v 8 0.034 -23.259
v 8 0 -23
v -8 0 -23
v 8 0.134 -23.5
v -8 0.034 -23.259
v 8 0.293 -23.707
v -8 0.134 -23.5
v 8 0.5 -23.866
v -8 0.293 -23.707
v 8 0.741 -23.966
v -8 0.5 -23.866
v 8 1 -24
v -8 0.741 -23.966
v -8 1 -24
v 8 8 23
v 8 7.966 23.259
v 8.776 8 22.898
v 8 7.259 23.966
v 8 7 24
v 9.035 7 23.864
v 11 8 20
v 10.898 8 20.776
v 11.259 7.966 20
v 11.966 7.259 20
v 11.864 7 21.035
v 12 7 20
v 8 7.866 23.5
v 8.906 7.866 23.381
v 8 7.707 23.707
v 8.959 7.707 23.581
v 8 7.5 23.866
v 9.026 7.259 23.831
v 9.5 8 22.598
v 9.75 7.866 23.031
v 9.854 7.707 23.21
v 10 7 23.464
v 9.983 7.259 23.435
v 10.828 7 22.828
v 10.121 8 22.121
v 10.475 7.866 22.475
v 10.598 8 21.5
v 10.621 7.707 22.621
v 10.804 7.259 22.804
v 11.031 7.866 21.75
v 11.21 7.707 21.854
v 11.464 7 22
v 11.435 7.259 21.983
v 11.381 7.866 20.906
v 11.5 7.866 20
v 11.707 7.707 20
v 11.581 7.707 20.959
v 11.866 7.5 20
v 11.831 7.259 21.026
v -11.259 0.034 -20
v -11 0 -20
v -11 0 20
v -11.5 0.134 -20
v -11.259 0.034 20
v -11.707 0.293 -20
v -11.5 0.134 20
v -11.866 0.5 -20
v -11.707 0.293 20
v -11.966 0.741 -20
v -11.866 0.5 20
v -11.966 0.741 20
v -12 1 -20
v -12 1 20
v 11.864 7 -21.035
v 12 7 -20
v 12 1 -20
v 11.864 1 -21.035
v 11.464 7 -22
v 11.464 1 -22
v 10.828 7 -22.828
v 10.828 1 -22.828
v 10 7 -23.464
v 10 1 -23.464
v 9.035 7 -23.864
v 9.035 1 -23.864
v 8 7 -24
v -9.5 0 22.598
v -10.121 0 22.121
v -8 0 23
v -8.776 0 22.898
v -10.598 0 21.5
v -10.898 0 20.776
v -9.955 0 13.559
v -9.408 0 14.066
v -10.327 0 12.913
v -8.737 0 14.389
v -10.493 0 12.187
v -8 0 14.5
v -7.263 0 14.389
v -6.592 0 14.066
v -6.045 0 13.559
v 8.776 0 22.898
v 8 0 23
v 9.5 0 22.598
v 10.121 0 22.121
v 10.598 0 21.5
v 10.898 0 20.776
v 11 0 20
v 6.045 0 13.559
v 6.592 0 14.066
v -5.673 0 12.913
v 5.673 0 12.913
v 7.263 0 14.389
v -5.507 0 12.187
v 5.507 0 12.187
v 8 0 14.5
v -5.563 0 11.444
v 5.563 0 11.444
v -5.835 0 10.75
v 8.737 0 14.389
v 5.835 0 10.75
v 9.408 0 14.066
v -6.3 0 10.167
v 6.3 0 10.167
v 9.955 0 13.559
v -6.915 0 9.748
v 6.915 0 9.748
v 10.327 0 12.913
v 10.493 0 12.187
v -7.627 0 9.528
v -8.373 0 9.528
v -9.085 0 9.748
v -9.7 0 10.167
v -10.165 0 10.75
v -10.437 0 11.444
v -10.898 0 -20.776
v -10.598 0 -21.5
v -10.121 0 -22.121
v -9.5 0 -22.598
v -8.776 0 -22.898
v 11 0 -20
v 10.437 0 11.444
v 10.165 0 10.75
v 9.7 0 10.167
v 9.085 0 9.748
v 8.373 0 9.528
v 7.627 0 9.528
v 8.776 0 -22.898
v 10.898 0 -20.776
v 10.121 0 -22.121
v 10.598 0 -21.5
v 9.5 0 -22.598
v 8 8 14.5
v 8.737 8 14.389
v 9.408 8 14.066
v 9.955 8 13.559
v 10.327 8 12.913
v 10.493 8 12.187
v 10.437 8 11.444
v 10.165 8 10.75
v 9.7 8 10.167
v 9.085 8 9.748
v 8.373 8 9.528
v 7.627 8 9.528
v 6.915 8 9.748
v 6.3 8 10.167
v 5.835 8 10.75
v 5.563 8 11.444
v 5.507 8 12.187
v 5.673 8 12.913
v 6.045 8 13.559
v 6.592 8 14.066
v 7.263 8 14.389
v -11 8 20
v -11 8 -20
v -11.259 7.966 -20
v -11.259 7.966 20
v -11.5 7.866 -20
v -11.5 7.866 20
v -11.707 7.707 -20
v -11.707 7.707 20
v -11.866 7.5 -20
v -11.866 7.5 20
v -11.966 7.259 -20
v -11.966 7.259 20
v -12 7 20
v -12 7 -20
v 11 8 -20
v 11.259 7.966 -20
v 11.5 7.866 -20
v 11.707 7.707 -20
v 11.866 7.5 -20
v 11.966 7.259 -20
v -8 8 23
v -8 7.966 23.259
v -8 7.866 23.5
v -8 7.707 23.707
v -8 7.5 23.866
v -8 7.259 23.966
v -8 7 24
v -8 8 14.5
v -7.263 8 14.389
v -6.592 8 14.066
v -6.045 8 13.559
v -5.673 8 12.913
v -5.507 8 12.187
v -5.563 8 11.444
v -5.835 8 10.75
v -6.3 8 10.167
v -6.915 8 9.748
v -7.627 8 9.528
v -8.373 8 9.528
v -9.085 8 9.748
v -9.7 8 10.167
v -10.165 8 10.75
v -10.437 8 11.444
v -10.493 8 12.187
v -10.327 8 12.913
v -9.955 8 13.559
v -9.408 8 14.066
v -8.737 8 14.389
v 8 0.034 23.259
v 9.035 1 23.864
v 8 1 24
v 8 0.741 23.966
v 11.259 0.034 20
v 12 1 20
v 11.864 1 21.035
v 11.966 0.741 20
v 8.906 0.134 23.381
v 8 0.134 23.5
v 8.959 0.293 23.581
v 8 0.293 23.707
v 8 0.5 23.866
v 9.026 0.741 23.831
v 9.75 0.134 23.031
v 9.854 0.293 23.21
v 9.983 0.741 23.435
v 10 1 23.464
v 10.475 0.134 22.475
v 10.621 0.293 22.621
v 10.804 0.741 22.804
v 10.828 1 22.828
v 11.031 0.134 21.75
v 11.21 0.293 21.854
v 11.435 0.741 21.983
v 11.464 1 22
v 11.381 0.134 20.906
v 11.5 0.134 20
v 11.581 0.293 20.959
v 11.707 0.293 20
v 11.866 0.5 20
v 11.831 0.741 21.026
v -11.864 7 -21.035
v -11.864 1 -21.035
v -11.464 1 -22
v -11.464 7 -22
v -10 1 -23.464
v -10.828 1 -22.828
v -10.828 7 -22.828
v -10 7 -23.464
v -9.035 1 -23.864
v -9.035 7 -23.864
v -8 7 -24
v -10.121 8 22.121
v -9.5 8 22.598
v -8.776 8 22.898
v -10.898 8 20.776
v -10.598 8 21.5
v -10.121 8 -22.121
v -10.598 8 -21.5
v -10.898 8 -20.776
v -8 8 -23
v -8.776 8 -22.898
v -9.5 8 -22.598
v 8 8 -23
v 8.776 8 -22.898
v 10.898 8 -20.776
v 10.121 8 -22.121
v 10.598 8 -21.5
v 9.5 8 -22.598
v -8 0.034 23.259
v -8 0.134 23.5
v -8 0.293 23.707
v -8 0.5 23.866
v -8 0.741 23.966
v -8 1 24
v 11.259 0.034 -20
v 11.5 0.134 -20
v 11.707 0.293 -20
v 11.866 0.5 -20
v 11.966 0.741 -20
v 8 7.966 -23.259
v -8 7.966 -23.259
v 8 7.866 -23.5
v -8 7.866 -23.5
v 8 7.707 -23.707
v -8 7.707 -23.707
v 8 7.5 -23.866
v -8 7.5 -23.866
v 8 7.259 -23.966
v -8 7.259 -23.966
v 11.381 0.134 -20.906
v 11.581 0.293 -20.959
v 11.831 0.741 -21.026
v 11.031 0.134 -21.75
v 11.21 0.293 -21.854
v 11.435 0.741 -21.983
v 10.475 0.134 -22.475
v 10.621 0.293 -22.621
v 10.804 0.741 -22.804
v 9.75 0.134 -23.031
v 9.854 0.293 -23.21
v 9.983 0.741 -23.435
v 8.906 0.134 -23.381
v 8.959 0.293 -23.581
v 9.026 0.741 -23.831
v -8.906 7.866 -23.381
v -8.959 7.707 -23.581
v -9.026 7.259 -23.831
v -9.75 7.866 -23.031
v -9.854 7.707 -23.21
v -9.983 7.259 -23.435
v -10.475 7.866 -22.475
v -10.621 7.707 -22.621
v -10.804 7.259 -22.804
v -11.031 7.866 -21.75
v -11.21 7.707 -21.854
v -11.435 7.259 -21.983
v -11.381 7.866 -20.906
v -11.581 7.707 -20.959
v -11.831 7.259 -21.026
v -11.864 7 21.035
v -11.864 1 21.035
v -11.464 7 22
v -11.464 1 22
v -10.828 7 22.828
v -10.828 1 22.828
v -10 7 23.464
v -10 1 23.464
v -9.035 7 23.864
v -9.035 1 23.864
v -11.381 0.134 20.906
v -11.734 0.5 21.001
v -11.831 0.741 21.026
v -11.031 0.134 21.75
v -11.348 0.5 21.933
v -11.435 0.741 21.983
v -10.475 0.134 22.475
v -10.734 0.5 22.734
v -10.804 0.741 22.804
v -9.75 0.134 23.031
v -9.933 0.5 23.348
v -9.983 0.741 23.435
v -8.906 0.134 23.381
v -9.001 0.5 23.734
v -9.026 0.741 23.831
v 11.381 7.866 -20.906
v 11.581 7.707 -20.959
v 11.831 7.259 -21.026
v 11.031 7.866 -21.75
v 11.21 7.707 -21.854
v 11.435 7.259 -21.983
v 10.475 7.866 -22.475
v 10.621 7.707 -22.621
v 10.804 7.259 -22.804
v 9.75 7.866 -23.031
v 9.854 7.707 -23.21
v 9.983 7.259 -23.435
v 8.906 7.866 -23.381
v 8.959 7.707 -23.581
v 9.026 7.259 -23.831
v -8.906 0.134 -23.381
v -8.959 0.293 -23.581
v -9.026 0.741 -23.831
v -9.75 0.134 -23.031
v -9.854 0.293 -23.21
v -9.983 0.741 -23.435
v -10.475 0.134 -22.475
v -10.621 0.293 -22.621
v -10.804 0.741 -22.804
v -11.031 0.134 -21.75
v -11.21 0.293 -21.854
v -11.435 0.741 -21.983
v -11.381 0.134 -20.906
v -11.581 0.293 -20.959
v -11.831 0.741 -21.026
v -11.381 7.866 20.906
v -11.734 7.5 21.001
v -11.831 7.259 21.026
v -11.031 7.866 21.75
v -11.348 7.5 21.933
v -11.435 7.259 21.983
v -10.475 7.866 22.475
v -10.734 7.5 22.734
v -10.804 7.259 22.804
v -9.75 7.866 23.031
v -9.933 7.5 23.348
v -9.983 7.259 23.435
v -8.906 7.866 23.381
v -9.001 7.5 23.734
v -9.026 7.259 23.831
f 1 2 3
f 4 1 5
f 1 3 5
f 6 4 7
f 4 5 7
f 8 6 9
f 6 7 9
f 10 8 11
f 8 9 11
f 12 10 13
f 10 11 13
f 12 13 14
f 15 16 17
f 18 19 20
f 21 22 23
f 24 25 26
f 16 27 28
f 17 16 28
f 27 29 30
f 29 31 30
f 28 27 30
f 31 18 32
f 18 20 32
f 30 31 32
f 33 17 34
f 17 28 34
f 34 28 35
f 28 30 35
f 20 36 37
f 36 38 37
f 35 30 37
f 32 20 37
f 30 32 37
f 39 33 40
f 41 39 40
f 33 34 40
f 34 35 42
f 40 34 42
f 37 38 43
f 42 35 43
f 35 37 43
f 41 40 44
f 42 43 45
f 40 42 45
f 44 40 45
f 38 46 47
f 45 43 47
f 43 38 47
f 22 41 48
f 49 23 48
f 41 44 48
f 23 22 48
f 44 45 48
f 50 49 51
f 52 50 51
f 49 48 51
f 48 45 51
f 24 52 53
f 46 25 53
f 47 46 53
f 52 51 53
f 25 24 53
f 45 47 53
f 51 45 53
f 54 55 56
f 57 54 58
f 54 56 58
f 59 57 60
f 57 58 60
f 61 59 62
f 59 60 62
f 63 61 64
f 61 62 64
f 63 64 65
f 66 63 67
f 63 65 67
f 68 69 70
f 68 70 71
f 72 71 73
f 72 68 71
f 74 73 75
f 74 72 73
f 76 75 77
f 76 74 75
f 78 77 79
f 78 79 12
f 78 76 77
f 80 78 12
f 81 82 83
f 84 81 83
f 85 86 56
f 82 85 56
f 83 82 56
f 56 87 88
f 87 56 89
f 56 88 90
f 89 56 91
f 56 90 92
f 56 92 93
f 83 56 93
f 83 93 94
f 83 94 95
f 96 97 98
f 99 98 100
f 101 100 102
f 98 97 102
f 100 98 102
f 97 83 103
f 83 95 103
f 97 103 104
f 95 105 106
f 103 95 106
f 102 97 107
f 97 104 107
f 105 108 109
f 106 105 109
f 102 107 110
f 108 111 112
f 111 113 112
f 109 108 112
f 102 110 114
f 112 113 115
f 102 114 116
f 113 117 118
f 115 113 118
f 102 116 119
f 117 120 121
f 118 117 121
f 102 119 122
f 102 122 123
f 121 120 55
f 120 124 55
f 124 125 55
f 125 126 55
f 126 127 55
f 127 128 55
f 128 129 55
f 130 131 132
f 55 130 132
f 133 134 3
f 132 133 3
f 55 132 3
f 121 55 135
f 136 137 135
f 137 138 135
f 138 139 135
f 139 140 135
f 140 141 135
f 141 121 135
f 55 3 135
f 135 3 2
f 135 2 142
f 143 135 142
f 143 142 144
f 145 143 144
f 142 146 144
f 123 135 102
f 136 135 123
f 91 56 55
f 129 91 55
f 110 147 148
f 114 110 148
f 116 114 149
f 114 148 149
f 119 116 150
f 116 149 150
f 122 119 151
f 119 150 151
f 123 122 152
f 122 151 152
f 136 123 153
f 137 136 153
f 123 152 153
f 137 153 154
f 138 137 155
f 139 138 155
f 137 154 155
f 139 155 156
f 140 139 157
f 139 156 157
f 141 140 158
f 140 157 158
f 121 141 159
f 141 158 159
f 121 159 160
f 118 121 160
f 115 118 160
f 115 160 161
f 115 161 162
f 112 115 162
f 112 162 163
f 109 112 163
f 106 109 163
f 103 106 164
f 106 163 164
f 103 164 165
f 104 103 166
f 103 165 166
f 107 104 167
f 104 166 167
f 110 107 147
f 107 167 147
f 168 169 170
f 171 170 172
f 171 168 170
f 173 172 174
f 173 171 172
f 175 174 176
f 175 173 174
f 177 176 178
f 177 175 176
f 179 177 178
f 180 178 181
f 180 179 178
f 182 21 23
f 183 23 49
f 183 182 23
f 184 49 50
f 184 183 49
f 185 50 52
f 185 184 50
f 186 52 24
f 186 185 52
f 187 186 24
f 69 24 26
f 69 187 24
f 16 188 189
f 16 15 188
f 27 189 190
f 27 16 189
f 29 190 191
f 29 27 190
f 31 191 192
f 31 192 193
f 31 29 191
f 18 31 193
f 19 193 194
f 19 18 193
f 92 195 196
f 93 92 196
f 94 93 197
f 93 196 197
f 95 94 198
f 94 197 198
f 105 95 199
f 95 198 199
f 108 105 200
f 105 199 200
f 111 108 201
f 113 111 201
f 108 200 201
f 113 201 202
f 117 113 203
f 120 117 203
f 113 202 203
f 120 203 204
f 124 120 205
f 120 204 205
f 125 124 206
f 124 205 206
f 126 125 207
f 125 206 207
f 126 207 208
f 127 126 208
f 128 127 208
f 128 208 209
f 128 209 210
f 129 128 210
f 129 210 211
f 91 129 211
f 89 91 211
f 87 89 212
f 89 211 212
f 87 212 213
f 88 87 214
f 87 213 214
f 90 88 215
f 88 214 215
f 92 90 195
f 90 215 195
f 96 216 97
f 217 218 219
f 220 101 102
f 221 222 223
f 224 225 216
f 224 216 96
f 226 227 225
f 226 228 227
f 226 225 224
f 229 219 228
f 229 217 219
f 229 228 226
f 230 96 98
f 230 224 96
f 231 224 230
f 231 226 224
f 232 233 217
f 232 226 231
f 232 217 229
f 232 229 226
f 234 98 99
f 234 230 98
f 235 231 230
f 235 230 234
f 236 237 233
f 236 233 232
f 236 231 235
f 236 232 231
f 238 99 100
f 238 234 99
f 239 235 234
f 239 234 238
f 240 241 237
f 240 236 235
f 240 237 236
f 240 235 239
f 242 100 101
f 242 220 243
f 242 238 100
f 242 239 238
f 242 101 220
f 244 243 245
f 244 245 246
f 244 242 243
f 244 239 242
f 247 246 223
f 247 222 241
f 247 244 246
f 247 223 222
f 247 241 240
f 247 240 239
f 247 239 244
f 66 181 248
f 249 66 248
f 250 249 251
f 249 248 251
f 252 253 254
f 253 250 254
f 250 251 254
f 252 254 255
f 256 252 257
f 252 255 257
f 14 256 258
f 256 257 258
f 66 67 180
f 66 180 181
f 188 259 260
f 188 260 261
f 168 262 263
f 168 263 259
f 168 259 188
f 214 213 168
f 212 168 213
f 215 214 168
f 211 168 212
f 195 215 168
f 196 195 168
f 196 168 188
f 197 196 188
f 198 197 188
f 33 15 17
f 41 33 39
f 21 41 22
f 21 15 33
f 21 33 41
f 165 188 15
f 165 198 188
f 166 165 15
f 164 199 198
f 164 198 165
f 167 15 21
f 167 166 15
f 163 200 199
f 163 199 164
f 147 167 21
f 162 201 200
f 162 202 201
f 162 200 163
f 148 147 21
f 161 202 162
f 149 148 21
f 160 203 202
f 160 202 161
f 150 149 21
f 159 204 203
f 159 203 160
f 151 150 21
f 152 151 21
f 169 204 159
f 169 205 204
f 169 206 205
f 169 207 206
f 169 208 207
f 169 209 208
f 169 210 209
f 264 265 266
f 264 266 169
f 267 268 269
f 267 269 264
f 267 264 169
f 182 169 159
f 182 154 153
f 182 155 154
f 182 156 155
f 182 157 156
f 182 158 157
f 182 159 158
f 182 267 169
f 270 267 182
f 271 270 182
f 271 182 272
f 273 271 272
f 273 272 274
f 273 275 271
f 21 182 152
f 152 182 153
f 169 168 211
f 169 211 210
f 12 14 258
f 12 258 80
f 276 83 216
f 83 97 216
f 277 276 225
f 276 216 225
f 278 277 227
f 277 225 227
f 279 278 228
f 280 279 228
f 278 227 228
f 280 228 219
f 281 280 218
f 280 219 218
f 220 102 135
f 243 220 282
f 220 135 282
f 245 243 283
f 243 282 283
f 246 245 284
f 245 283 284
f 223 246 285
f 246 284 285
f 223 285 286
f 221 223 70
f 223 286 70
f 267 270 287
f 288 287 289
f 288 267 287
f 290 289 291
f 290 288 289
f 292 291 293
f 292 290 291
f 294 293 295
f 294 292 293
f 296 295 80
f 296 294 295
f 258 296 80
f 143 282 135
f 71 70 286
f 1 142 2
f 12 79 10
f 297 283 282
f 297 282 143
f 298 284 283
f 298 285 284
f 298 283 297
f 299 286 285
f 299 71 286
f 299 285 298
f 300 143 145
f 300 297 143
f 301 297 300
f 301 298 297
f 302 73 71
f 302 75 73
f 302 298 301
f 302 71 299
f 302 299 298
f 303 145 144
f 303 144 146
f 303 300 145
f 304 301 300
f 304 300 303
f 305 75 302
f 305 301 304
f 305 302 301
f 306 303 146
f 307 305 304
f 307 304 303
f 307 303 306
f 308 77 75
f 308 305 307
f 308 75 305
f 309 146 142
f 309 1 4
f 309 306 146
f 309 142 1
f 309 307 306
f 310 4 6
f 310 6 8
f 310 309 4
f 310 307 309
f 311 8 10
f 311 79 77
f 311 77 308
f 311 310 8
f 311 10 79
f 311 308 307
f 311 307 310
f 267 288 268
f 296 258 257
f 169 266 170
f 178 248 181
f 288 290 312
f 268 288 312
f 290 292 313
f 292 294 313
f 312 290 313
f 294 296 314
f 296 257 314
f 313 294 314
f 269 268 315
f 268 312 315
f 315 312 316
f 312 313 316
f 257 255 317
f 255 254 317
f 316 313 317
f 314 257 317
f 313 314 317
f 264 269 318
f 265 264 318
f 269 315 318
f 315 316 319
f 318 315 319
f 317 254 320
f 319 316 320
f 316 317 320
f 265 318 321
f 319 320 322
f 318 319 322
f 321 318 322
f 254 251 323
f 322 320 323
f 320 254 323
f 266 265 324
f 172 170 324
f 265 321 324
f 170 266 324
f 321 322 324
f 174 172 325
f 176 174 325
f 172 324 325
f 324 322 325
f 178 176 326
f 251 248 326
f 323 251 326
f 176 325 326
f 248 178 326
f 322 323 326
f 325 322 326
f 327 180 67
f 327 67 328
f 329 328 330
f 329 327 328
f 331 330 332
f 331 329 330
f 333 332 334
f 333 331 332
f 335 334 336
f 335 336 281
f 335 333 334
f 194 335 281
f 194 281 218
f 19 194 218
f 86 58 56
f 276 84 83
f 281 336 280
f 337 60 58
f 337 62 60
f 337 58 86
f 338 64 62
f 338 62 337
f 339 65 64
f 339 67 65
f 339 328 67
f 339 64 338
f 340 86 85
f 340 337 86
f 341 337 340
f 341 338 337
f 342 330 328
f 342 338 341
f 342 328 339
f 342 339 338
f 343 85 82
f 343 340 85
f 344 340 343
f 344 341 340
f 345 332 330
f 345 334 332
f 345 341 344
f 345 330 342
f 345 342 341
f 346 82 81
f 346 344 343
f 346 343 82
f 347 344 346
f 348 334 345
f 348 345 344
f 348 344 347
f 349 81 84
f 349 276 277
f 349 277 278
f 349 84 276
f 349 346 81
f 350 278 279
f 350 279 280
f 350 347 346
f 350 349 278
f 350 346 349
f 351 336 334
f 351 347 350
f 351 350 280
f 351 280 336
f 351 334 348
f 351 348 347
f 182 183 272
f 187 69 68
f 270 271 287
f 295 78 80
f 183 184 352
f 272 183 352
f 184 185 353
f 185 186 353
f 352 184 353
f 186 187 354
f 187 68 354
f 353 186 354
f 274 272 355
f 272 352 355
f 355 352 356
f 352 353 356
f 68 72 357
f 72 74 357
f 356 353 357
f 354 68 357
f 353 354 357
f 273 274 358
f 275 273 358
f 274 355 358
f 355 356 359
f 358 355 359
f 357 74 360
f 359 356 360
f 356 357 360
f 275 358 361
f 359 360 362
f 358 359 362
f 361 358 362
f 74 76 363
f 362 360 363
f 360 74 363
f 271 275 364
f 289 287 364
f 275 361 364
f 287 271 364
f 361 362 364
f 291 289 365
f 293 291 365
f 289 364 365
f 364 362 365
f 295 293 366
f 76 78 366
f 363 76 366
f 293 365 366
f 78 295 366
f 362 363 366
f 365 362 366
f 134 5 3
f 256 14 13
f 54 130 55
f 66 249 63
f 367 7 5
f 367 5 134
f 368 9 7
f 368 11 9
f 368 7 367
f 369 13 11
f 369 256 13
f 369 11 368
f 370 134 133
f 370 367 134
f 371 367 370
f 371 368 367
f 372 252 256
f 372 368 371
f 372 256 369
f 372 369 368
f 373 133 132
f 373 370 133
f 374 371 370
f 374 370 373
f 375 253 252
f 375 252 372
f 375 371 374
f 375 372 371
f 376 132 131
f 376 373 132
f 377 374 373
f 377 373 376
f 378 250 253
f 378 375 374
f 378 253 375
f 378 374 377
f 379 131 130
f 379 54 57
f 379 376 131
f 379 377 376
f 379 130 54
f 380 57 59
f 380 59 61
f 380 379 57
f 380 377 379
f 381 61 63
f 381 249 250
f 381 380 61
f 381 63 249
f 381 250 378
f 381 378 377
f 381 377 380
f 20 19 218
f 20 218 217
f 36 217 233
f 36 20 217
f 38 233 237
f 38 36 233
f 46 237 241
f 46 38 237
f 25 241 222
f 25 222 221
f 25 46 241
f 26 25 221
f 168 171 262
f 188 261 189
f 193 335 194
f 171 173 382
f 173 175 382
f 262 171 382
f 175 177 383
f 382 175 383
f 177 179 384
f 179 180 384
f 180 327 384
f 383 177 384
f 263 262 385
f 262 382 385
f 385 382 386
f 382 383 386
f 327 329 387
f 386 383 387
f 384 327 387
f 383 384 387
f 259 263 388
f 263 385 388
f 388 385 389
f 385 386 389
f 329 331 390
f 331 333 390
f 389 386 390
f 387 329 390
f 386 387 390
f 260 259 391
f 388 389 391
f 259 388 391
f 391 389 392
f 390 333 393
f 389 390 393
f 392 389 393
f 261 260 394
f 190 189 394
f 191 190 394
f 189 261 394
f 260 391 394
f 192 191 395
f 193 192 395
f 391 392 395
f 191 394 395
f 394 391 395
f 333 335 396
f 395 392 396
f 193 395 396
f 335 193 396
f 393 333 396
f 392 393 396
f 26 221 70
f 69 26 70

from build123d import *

# Parameters (mm, degrees)
SKETCH1_W           = 24
SKETCH1_H           = 48
BOSS_EXTRUDE1_DEPTH = 8
FILLET2_R           = 4
SKETCH2_R           = 2.5
CUT_EXTRUDE1_DEPTH  = 8
FILLET3_R           = 1


with BuildPart() as part:
    # Sketch1 → Boss-Extrude1 (new body)
    with BuildSketch(Plane(origin=(0, 0, 0), x_dir=(1, 0, 0), z_dir=(0, 1, 0))):
        Rectangle(SKETCH1_W, SKETCH1_H)
    extrude(amount=BOSS_EXTRUDE1_DEPTH)

    # Fillet2
    fillet2_edges = [part.edges().sort_by_distance(p)[0] for p in [
        (-12, 4, 24),
        (-12, 4, -24),
        (12, 4, -24),
        (12, 4, 24),
    ]]
    fillet(fillet2_edges, radius=FILLET2_R)

    # Sketch2 → Cut-Extrude1 (cut)
    with BuildSketch(Plane(origin=(0, 8, 0), x_dir=(1, 0, 0), z_dir=(0, 1, 0))):
        with Locations(Location((8, -12, 0), (0, 0, 270))):
            Circle(SKETCH2_R)
        with Locations(Location((-8, -12, 0), (0, 0, 270))):
            Circle(SKETCH2_R)
    extrude(amount=-CUT_EXTRUDE1_DEPTH, mode=Mode.SUBTRACT)

    # Fillet3
    fillet3_edges = [part.edges().sort_by_distance(p)[0] for p in [
        (0, 0, 24),
        (0, 8, 24),
        (-12, 0, 0),
        (0, 0, -24),
        (12, 0, 0),
        (10.828427125, 0, -22.828427125),
        (10.828427125, 0, 22.828427125),
        (-10.828427125, 0, -22.828427125),
        (-10.828427125, 0, 22.828427125),
        (-12, 8, 0),
        (12, 8, 0),
        (0, 8, -24),
        (10.828427125, 8, -22.828427125),
        (10.828427125, 8, 22.828427125),
        (-10.828427125, 8, -22.828427125),
        (-10.828427125, 8, 22.828427125),
    ]]
    fillet(fillet3_edges, radius=FILLET3_R)


solid = part.part
